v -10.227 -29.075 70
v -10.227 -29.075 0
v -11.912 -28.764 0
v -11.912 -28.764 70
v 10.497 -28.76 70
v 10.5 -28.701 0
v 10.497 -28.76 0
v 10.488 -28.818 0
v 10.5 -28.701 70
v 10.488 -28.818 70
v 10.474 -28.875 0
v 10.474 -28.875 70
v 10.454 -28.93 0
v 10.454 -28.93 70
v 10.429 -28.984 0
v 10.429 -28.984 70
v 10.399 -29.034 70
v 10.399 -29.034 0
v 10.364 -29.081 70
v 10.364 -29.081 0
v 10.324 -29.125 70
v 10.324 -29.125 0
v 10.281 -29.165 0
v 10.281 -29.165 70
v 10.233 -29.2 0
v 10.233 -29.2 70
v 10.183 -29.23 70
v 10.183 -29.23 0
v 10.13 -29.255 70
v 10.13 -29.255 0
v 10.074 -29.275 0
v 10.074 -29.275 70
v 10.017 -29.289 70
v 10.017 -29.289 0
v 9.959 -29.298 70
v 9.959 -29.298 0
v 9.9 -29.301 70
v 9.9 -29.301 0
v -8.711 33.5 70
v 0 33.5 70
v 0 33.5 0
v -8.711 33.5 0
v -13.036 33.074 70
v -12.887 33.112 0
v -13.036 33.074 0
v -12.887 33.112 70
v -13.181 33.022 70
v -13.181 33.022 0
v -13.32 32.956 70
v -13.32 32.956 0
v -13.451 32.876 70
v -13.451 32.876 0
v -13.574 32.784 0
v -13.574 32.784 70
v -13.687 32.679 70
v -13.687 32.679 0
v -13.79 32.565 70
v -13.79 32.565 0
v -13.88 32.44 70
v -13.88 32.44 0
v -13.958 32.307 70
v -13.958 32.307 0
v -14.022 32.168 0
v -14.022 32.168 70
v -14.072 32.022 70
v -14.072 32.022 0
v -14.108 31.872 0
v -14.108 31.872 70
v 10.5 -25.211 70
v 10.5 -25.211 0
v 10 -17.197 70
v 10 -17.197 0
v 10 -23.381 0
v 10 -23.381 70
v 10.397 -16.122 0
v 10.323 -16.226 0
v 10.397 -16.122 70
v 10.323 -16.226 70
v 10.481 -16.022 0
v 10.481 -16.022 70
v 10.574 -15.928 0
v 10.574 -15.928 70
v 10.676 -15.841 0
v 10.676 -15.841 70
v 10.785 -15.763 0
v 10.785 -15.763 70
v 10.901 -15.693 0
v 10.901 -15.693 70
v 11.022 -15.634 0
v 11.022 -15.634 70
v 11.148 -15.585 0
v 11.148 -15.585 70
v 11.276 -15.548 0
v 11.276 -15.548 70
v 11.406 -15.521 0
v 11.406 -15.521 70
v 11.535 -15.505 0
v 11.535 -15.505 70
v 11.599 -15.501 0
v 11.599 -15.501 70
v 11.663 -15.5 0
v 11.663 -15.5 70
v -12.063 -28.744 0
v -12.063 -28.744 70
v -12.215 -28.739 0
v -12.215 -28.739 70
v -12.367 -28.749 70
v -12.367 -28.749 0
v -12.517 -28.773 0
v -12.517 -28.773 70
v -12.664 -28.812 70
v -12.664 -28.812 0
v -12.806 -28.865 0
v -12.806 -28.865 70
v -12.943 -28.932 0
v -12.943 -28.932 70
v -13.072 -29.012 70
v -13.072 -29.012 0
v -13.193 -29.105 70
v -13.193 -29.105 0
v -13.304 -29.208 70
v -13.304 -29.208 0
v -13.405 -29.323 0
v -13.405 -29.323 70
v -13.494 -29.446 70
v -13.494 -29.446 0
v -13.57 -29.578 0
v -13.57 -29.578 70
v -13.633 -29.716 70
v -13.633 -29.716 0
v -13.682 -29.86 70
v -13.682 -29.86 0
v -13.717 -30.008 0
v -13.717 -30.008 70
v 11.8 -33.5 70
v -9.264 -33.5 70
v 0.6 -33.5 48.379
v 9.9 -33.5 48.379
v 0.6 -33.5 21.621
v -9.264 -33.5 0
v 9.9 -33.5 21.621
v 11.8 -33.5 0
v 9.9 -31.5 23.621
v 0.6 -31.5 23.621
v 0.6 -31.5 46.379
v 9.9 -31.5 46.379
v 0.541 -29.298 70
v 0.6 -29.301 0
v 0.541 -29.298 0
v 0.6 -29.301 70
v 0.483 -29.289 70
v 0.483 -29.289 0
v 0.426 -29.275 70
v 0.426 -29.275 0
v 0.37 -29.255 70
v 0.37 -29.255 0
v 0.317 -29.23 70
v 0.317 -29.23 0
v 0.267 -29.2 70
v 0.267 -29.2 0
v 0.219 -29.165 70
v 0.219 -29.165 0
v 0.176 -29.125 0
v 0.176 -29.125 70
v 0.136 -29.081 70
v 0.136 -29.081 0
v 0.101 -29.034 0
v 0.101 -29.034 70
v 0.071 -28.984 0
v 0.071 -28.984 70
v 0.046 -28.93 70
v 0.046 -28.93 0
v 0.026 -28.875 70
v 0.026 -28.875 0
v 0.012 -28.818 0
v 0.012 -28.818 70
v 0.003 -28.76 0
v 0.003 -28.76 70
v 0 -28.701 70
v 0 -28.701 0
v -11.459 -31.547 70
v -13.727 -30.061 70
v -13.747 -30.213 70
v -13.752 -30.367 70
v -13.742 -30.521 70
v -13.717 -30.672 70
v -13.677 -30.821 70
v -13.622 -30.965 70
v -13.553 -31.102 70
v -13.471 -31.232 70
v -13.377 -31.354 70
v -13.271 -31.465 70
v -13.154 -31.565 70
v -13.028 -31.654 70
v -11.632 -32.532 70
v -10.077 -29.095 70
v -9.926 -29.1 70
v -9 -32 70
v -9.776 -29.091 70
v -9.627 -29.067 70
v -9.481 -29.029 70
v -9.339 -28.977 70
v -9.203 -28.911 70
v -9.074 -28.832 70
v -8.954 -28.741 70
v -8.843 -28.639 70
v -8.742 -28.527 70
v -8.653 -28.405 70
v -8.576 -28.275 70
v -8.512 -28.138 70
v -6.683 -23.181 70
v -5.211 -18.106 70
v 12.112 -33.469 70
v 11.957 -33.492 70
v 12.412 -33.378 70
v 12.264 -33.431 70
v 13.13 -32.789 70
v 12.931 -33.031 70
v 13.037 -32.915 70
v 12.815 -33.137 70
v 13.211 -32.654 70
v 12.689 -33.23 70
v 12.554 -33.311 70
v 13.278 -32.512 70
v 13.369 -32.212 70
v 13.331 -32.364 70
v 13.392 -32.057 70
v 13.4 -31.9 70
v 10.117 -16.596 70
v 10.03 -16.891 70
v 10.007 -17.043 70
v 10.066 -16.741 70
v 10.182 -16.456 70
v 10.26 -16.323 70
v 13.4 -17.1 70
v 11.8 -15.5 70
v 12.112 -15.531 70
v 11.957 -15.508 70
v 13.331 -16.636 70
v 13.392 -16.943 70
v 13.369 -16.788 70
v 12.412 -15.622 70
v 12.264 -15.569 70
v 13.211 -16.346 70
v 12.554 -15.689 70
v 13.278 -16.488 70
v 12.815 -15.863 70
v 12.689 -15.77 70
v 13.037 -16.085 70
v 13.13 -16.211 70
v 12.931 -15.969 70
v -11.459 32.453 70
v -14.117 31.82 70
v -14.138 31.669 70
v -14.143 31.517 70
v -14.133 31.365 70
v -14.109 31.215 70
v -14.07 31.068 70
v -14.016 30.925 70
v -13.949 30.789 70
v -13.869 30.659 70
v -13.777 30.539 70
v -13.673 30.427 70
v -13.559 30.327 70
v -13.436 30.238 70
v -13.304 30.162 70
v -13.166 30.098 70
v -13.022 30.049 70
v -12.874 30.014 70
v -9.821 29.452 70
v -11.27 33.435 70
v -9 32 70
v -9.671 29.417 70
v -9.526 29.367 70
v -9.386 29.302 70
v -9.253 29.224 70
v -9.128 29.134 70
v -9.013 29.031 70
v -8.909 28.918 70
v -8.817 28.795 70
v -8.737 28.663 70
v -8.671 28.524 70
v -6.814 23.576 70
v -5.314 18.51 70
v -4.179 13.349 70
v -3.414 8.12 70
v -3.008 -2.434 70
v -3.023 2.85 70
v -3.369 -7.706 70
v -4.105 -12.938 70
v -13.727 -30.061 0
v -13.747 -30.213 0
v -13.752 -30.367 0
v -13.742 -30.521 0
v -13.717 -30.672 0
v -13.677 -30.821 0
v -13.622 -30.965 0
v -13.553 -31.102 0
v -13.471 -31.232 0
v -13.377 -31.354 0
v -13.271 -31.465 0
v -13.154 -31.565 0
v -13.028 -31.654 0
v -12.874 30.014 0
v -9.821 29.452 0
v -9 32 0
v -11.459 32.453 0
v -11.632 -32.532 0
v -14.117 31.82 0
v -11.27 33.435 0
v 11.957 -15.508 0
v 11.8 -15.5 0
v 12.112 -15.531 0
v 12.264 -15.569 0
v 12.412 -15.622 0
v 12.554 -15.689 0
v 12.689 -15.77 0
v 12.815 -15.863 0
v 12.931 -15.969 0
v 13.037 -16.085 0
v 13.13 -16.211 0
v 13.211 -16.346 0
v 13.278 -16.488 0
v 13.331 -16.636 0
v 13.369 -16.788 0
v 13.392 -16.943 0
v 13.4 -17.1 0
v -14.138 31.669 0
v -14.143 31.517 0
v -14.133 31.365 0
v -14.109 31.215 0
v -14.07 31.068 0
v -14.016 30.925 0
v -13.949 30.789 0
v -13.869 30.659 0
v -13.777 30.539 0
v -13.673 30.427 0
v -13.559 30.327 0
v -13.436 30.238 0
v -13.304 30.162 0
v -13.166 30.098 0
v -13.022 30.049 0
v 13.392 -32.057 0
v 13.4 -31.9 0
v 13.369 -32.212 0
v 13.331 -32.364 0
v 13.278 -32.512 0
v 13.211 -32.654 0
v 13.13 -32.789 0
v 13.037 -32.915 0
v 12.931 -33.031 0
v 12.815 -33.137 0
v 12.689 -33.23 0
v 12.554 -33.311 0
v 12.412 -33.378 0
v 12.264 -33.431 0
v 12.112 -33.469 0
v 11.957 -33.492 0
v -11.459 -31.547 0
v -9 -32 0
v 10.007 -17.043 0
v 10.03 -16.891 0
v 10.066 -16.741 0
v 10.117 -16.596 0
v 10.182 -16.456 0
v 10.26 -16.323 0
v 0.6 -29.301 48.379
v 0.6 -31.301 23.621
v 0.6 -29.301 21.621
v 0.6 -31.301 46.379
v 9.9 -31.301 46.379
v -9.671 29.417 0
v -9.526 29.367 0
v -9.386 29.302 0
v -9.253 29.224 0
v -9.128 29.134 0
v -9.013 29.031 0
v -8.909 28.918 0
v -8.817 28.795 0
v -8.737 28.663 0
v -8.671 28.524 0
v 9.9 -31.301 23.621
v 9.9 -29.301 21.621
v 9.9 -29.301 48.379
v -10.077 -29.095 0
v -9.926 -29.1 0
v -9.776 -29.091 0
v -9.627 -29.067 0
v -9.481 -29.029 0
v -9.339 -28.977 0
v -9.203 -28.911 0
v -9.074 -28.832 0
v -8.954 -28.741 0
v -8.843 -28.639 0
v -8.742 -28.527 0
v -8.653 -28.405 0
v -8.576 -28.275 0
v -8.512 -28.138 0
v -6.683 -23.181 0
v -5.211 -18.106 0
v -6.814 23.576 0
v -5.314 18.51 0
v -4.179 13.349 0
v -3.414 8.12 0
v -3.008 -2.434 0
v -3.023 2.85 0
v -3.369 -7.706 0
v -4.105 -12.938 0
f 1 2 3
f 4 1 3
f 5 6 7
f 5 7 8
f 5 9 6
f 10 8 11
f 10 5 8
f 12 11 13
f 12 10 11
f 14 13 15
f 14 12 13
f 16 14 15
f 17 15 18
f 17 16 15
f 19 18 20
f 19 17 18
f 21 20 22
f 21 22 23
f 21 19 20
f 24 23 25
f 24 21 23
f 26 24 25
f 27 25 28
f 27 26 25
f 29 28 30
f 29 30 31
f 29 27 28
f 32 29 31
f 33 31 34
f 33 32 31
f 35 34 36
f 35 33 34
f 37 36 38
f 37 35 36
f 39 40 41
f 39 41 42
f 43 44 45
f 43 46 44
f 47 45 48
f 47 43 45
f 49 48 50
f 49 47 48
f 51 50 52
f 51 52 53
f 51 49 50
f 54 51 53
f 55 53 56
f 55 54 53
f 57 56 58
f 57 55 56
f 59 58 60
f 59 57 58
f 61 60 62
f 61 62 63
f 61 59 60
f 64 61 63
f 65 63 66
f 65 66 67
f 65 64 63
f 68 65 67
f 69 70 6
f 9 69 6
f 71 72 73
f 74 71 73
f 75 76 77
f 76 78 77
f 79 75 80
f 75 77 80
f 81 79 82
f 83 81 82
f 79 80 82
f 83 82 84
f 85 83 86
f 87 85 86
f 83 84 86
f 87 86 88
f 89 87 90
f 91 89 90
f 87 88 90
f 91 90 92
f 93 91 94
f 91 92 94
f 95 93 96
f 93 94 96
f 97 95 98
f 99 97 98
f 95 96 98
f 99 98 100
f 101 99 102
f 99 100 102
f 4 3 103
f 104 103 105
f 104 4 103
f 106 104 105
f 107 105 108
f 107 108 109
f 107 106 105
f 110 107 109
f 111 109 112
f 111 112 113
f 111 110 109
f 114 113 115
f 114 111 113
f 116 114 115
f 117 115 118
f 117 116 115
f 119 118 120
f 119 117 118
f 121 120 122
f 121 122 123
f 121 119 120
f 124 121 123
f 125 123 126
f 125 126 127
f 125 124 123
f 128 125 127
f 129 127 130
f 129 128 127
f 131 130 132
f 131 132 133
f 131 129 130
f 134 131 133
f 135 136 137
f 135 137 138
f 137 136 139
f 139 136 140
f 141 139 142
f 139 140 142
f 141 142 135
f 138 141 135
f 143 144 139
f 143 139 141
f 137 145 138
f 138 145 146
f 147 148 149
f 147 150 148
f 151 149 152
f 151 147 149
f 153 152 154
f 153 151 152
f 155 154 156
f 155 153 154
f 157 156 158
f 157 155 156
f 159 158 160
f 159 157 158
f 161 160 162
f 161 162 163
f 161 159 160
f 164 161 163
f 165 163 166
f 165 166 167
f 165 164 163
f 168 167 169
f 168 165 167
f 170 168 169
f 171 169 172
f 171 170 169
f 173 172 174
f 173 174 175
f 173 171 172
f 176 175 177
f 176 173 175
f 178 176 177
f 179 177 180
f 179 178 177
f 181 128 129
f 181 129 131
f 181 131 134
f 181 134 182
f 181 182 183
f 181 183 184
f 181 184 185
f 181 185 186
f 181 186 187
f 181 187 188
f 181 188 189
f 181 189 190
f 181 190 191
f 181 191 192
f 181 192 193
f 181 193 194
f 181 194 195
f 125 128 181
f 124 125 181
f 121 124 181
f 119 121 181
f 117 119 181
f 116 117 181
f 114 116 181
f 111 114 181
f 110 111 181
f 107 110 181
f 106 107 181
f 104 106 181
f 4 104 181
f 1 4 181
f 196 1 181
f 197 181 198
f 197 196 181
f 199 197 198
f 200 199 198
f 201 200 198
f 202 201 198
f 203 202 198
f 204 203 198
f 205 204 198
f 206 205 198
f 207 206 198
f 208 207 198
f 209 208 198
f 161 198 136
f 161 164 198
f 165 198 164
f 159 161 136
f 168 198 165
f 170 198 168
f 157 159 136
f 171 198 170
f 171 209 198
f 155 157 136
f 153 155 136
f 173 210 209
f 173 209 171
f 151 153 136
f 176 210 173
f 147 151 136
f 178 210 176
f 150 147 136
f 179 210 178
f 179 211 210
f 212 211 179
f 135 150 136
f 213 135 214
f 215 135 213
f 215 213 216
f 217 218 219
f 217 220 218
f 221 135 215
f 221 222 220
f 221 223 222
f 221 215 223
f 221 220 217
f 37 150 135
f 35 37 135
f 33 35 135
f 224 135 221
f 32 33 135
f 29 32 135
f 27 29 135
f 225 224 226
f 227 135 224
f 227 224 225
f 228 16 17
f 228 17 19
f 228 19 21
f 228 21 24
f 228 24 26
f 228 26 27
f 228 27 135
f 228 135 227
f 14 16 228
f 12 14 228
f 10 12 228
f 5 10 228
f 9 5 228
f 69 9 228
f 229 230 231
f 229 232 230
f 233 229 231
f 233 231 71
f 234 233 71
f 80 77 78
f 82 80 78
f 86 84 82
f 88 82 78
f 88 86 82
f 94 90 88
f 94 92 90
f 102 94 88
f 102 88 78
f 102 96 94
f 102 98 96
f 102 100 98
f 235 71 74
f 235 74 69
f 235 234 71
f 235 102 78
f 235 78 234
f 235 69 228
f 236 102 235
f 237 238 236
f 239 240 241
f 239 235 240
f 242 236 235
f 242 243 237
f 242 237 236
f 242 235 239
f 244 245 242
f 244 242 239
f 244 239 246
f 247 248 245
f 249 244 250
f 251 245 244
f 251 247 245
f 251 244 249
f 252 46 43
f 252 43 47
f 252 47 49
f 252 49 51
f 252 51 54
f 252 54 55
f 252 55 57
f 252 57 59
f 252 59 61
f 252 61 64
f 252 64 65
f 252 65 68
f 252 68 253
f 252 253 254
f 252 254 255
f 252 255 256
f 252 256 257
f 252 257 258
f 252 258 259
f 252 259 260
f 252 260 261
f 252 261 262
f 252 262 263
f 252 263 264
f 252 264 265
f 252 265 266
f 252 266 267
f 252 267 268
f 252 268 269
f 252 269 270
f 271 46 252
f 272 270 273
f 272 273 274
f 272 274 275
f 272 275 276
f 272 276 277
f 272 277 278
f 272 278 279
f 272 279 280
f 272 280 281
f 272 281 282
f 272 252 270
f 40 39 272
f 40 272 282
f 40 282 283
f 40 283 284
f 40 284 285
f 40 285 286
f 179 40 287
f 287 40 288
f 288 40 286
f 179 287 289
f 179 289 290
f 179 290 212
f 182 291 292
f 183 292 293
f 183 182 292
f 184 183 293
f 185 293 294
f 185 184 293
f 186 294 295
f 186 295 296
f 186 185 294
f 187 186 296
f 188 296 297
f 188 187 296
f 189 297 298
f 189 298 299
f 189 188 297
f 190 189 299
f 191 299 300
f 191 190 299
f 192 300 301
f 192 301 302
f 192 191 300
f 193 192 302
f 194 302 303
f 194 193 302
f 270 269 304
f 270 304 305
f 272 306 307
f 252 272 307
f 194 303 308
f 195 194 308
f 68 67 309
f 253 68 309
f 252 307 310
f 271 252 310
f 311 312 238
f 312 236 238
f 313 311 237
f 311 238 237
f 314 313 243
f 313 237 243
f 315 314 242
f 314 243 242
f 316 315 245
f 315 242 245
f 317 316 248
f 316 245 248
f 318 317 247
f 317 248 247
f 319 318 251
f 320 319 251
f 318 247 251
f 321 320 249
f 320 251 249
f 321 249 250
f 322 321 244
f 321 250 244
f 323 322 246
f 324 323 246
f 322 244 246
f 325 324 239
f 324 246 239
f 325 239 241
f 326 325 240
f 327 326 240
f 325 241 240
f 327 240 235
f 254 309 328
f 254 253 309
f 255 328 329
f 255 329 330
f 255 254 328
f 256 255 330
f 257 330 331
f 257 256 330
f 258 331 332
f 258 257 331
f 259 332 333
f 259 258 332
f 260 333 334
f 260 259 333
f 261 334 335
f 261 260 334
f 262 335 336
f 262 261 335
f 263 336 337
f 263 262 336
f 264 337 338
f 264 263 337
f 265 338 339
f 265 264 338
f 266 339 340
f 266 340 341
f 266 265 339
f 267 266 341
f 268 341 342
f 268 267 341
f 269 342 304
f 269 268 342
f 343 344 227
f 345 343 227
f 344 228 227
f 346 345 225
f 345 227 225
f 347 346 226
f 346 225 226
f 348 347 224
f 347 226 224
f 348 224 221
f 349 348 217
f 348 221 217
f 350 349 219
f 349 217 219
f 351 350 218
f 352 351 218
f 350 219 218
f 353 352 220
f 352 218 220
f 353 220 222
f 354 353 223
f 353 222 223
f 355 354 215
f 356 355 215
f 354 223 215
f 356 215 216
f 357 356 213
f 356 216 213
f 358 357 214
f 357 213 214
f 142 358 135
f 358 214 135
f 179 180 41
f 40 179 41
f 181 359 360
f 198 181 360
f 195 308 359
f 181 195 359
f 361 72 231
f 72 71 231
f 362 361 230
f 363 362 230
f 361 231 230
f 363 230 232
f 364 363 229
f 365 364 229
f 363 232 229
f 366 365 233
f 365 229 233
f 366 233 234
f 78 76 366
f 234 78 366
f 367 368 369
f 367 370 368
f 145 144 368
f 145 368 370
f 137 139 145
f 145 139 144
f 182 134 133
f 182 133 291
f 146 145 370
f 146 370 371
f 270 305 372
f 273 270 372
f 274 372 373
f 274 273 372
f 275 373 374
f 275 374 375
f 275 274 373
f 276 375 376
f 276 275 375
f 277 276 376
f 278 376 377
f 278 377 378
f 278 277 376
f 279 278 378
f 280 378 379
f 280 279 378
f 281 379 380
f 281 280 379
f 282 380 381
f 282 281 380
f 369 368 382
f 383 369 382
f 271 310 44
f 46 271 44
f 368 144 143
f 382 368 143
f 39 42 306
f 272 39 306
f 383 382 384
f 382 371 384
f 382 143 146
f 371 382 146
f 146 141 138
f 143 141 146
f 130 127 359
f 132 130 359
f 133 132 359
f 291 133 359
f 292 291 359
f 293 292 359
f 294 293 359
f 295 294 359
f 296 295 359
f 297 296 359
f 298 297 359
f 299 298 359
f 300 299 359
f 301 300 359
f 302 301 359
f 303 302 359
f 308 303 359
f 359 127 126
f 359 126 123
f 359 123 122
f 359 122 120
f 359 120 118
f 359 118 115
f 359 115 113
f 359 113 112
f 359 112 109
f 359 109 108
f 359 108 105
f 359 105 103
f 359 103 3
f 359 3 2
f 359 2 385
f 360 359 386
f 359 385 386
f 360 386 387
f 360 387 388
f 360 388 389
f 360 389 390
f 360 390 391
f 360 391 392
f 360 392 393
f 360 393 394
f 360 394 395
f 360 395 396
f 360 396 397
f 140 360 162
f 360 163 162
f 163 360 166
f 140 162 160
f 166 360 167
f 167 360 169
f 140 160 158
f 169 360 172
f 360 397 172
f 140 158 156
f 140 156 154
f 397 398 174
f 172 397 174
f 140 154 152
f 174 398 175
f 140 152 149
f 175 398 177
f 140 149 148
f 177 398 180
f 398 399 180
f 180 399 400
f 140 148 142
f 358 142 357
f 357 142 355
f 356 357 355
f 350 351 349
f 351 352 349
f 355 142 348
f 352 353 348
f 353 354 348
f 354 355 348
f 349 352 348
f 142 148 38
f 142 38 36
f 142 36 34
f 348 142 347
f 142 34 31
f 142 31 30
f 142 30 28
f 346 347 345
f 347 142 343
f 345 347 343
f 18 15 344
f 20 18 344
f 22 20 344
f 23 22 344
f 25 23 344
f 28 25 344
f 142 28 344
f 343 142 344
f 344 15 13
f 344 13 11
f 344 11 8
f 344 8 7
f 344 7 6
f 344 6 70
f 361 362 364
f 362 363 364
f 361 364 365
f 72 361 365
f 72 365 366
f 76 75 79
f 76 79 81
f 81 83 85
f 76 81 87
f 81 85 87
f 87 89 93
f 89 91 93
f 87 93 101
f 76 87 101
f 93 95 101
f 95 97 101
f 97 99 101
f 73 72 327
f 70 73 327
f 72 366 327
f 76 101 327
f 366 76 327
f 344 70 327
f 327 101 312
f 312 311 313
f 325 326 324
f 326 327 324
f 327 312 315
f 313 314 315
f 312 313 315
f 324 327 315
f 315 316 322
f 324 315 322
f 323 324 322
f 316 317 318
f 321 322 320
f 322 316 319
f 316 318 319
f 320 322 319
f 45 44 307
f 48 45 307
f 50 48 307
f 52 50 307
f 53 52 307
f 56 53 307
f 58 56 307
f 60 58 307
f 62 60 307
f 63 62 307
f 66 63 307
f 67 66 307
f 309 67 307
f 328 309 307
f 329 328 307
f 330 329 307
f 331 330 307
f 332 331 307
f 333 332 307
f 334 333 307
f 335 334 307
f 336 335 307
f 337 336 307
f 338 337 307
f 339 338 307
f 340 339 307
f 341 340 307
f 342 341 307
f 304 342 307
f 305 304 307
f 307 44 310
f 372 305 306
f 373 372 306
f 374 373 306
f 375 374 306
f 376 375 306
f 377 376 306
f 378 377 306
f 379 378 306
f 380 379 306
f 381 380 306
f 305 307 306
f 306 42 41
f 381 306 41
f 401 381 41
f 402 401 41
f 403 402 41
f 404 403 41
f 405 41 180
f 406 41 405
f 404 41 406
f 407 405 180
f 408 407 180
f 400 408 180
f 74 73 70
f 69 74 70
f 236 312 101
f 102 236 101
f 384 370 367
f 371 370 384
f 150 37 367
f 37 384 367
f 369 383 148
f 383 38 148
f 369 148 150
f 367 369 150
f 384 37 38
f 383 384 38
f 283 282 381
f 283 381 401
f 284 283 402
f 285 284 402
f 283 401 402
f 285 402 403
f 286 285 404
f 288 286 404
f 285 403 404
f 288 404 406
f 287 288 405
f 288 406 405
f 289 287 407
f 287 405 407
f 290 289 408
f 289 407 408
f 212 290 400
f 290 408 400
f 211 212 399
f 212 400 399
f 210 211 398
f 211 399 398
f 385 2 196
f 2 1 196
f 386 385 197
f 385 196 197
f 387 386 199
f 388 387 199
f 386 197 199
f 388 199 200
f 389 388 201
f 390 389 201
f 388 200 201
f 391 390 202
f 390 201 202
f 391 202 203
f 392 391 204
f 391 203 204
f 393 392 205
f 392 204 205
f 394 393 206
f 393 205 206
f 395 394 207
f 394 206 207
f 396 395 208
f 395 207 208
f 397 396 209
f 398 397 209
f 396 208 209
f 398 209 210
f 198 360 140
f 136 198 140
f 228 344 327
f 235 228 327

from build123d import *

# Parameters (mm, degrees)
F0_W     = 9
F0_H     = 2.6991704602
F0_H_2   = 1.5
F1_DEPTH = 70
F2_R     = 1.55
F3_W     = 9.3
F3_H     = 22.7586206897
F4_DEPTH = 5
F5_SIZE  = 2
F6_R     = 0.59999
F7_R     = 1.6


# Not quite as in the source:
# - a fillet or chamfer is up to 0.001 mm smaller than in the source, because OpenCascade refuses the exact size
# - a feature names something its author has since deleted; it is built from what else it names


with BuildPart() as f1:
    # F0 (on Top) → F1 (new body)
    with BuildSketch(Plane.XY):
        Polygon((-9, -32), (-9, -29.3008295398), (-13.4364079285, -28.4836487781), (-13.9172762663, -31.0942438952), (-11.4586381331, -31.5471219476), align=None)
        with Locations((-4.5, -30.6504147699)):
            Rectangle(F0_W, F0_H)
        Polygon((-9, -33.5), (-9, -32), (-9.2639088239, -33.5), align=None)
        with Locations((-4.5, -32.75)):
            Rectangle(F0_W, F0_H_2)
        Polygon((-11.6319159151, -32.5319949396), (-11.4586381331, -31.5471219476), (-13.9172762663, -31.0942438952), align=None)
        with BuildLine():
            Line((0, -29.3008295398), (0, 29.3008295398))
            Line((0, 29.3008295398), (-9, 29.3008295398))
            ThreePointArc((-9, 29.3008295398), (-2.9680403173, 0), (-9, -29.3008295398))
            Line((-9, -29.3008295398), (0, -29.3008295398))
        make_face()
        with Locations((-4.5, 30.6504147699)):
            Rectangle(F0_W, F0_H)
        Polygon((0, 32), (0, 33.5), (-8.7112760279, 33.5), (-9, 32), align=None)
        Polygon((-9, 29.3008295398), (-9, 32), (-11.4586381331, 32.4528780524), (-13.9172762663, 32.9057561048), (-14.398144604, 30.2951609877), align=None)
        Polygon((-13.9172762663, 32.9057561048), (-11.4586381331, 32.4528780524), (-11.2696250671, 33.4348526248), align=None)
        Polygon((10.5, -29.3008295398), (0, -29.3008295398), (0, -32), (0, -33.5), (13.4, -33.5), (13.4, -15.5), (10.7962751514, -15.5), (10.5, -15.9545544746), (10.5, -22.238118574), (10.5, -25.2114422619), align=None)
        Polygon((10, -23.3806278557), (10.5, -25.2114422619), (10.5, -22.238118574), (10.5, -15.9545544746), (10, -16.7216698947), align=None)
    extrude(amount=F1_DEPTH)

    # F2
    f2_edges = [f1.edges().sort_by_distance(p)[0] for p in [
        (-14.398145, 30.295161, 35),
        (-9, 29.30083, 35),
        (-13.436408, -28.483649, 35),
        (-9, -29.30083, 35),
        (-13.917276, -31.094244, 35),
        (-13.917276, 32.905756, 35),
    ]]
    fillet(f2_edges, radius=F2_R)

    # F3 (on face) → F4 (cut)
    with BuildSketch(Plane.XZ.offset(33.5)):
        with Locations((5.25, 35)):
            Rectangle(F3_W, F3_H)
    extrude(amount=-F4_DEPTH, mode=Mode.SUBTRACT)

    # F5
    f5_edges = [f1.edges().sort_by_distance(p)[0] for p in [
        (5.25, -33.5, 46.37931),
        (5.25, -33.5, 23.62069),
        (5.25, -29.30083, 23.62069),
        (5.25, -29.30083, 46.37931),
    ]]
    chamfer(f5_edges, length=F5_SIZE)

    # F6 (radius 0.6 in the source; OpenCascade refuses exactly that, so slightly less here)
    f6_edges = [f1.edges().sort_by_distance(p)[0] for p in [
        (0, -29.30083, 35),
        (10.5, -29.30083, 35),
    ]]
    fillet(f6_edges, radius=F6_R)

    # F7
    f7_edges = [f1.edges().sort_by_distance(p)[0] for p in [
        (10.796275, -15.5, 35),
        (13.4, -15.5, 35),
        (10, -16.72167, 35),
        (13.4, -33.5, 35),
    ]]
    fillet(f7_edges, radius=F7_R)


solid = f1.part
